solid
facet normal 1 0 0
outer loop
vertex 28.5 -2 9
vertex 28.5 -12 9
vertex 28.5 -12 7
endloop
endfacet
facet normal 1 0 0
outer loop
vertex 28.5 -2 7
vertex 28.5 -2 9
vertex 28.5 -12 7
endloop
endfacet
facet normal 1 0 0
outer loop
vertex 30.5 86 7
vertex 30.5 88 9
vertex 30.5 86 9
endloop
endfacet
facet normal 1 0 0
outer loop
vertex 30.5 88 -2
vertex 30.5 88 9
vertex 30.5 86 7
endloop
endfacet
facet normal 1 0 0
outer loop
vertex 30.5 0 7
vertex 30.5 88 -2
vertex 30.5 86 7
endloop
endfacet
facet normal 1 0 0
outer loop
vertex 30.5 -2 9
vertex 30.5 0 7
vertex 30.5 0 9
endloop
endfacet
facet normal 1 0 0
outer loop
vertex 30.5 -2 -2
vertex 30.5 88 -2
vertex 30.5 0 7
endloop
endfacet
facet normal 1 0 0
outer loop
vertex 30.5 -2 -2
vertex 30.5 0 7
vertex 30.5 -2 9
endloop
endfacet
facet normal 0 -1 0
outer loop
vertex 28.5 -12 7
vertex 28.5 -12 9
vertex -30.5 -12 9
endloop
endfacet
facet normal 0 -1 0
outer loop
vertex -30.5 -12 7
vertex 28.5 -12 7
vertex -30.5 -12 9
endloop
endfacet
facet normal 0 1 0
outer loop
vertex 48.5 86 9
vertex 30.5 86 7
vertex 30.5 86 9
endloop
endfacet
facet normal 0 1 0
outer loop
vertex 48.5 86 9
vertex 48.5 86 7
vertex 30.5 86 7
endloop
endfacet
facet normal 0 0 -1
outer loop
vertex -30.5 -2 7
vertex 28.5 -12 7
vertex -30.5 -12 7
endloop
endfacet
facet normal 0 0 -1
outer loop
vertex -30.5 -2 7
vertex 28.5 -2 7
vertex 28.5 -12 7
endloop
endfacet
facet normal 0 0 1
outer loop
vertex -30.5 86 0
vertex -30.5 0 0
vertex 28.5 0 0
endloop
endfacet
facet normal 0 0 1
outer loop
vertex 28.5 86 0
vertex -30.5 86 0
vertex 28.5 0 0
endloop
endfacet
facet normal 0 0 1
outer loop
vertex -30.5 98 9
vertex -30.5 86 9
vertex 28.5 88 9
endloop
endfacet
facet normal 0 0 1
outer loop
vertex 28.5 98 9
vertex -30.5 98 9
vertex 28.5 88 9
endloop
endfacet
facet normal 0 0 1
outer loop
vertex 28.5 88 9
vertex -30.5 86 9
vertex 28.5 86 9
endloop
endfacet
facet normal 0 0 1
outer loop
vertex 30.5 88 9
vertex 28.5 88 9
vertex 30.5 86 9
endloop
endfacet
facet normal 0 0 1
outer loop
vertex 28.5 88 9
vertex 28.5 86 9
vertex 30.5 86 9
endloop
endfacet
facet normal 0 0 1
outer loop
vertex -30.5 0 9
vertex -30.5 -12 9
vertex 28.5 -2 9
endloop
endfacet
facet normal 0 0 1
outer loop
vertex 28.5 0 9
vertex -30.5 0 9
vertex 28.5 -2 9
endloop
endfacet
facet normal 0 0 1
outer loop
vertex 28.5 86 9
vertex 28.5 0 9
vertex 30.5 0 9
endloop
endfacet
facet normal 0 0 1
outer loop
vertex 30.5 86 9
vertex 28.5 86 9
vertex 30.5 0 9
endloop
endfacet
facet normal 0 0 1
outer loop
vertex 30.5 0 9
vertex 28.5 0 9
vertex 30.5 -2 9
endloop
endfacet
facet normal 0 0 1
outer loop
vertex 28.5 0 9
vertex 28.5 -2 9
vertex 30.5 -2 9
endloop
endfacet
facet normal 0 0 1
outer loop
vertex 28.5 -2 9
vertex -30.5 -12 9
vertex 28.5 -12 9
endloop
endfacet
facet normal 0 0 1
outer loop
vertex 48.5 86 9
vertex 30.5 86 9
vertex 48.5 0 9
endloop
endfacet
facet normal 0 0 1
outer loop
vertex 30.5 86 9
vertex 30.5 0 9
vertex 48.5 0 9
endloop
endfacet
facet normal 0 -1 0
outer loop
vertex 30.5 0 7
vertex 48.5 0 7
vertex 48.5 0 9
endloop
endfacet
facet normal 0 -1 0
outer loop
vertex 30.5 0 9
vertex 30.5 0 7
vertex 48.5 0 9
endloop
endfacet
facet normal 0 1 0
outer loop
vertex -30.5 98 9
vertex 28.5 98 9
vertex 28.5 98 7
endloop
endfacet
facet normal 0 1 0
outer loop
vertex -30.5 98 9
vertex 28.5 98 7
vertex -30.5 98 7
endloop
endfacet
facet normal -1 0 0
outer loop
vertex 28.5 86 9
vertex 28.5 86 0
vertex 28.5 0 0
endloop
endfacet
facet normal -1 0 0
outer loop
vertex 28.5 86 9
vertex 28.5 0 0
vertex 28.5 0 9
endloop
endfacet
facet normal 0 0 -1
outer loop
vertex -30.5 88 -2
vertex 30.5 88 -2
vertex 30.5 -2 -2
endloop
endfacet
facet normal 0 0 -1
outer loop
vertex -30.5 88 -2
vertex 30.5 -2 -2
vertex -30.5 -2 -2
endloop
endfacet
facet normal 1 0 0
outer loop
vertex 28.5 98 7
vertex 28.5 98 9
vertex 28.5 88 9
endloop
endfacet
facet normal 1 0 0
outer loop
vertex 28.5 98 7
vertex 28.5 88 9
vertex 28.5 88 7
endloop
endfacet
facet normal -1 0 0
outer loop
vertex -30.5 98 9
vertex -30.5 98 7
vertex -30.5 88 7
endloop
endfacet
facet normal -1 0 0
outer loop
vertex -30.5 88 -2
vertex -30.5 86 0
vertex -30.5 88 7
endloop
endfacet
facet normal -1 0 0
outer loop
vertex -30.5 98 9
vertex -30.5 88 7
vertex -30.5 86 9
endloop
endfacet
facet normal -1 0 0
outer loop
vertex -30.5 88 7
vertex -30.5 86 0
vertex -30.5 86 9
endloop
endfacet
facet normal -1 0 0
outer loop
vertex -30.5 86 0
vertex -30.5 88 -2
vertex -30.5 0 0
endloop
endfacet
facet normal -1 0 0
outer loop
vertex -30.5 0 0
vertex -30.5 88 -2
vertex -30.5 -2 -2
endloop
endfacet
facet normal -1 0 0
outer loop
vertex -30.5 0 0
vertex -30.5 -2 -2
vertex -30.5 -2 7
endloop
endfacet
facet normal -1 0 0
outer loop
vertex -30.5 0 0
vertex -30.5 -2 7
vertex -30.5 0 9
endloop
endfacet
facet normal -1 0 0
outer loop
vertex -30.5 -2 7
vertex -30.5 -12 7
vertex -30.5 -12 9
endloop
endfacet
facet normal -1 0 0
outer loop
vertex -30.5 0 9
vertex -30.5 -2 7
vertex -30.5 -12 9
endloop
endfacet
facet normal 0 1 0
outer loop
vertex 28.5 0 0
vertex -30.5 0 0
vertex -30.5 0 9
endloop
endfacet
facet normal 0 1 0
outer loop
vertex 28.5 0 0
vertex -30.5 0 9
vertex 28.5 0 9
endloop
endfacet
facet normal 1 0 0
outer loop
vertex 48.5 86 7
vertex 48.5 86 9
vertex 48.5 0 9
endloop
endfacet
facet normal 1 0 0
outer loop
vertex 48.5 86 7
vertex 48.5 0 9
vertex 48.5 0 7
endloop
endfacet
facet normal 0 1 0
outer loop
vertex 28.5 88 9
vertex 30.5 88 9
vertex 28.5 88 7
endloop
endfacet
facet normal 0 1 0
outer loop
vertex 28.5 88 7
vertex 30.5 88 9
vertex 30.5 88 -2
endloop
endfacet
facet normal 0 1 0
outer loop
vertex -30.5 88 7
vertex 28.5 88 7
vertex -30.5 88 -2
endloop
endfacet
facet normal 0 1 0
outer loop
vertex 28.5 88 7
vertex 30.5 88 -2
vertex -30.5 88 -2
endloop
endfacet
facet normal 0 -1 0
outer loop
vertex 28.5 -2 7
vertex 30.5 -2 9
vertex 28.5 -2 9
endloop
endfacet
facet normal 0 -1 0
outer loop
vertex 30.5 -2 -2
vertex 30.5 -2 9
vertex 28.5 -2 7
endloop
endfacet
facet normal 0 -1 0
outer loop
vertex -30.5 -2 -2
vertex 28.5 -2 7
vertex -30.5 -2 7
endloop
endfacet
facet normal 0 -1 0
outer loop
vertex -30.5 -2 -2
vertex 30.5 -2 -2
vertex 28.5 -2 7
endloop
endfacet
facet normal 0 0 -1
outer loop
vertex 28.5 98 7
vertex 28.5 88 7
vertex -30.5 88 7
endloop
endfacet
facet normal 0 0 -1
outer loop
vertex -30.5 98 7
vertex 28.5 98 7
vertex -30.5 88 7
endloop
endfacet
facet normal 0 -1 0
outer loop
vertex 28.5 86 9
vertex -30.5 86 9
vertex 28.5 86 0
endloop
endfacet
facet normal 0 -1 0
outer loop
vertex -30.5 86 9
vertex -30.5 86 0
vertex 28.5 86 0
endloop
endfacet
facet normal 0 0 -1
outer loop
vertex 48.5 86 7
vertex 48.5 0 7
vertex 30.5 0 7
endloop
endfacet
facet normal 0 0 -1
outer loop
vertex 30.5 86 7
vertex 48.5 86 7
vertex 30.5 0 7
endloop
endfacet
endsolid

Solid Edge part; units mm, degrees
sketch "Sketch1" plane through (0, 0, 0) normal (0, -1, 0) x (1, 0, 0)
  line L0 (-28.5, 0) -> (28.5, 0)
  line L1 (28.5, 0) -> (28.5, 9)
  line L2 (28.5, 9) -> (48.5, 9)
  line L3 (48.5, 9) -> (48.5, 7)
  line L4 (48.5, 7) -> (30.5, 7)
  line L5 (30.5, 7) -> (30.5, -2)
  line L6 (30.5, -2) -> (-30.5, -2)
  line L7 (-30.5, -2) -> (-30.5, 0)
  line L8 (-28.5, 0) -> (-30.5, 0)
extrude "Protrusion1" add sketch "Sketch1" against normal blind 86
sketch "Sketch2" plane through (0, 43, -2) normal (0, 0, -1) x (0, -1, 0)
  line L0 (-43, 30.5) -> (-43, -30.5)
  line L1 (-43, -30.5) -> (-45, -30.5)
  line L2 (-45, -30.5) -> (-45, 30.5)
  line L3 (-45, 30.5) -> (-43, 30.5)
  line L4 (45, -30.5) -> (45, 30.5)
  line L5 (45, 30.5) -> (43, 30.5)
  line L6 (43, 30.5) -> (43, -30.5)
  line L7 (43, -30.5) -> (45, -30.5)
extrude "ExtrudedProtrusion_2" add sketch "Sketch2" against normal blind 11
sketch "Sketch3" plane through (0, -2, 3.5) normal (0, -1, 0) x (1, 0, 0)
  line L0 (28.5, 3.5) -> (-30.5, 3.5)
  line L1 (-30.5, 3.5) -> (-30.5, 5.5)
  line L2 (-30.5, 5.5) -> (28.5, 5.5)
  line L3 (28.5, 5.5) -> (28.5, 3.5)
extrude "ExtrudedProtrusion_3" add sketch "Sketch3" along normal blind 20
sketch "Sketch4" plane through (0, 88, 3.5) normal (0, 1, 0) x (-1, 0, 0)
  line L0 (-28.5, 3.5) -> (30.5, 3.5)
  line L1 (30.5, 3.5) -> (30.5, 5.5)
  line L2 (30.5, 5.5) -> (-28.5, 5.5)
  line L3 (-28.5, 5.5) -> (-28.5, 3.5)
extrude "ExtrudedProtrusion_4" add sketch "Sketch4" along normal blind 20
sketch "Sketch5" plane through (9, 43, 9) normal (0, 0, 1) x (1, 0, 0)
  line L0 (19.5, -55) -> (-39.5, -55)
  line L1 (-39.5, -55) -> (-39.5, -65)
  line L2 (-39.5, -65) -> (19.5, -65)
  line L3 (19.5, -65) -> (19.5, -55)
  line L4 (19.5, 55) -> (-39.5, 55)
  line L5 (-39.5, 55) -> (-39.5, 65)
  line L6 (-39.5, 65) -> (19.5, 65)
  line L7 (19.5, 65) -> (19.5, 55)
extrude "Cutout1" cut sketch "Sketch5" against normal up to next
